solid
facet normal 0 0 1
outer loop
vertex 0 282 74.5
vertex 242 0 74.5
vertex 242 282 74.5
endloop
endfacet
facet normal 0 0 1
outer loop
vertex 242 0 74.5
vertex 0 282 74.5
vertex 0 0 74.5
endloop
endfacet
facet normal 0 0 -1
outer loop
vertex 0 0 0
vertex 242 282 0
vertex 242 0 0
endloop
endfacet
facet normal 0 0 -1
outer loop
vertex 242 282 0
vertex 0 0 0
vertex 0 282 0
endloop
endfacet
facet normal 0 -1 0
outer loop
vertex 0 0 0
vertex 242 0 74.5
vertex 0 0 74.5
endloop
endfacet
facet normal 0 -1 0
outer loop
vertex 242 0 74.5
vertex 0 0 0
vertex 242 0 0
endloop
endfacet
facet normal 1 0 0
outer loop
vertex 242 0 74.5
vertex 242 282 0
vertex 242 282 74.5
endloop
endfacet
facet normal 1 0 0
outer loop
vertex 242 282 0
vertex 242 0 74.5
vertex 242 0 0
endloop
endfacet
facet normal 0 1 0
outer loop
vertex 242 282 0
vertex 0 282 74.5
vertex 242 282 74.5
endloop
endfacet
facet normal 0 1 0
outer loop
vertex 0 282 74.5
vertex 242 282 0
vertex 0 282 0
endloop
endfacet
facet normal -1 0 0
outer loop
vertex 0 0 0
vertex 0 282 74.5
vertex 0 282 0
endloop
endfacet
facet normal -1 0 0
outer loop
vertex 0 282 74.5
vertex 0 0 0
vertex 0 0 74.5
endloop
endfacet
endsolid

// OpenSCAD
box_size = [242, 282, 74.5];
card_tray_height = 70;

cube(box_size);
